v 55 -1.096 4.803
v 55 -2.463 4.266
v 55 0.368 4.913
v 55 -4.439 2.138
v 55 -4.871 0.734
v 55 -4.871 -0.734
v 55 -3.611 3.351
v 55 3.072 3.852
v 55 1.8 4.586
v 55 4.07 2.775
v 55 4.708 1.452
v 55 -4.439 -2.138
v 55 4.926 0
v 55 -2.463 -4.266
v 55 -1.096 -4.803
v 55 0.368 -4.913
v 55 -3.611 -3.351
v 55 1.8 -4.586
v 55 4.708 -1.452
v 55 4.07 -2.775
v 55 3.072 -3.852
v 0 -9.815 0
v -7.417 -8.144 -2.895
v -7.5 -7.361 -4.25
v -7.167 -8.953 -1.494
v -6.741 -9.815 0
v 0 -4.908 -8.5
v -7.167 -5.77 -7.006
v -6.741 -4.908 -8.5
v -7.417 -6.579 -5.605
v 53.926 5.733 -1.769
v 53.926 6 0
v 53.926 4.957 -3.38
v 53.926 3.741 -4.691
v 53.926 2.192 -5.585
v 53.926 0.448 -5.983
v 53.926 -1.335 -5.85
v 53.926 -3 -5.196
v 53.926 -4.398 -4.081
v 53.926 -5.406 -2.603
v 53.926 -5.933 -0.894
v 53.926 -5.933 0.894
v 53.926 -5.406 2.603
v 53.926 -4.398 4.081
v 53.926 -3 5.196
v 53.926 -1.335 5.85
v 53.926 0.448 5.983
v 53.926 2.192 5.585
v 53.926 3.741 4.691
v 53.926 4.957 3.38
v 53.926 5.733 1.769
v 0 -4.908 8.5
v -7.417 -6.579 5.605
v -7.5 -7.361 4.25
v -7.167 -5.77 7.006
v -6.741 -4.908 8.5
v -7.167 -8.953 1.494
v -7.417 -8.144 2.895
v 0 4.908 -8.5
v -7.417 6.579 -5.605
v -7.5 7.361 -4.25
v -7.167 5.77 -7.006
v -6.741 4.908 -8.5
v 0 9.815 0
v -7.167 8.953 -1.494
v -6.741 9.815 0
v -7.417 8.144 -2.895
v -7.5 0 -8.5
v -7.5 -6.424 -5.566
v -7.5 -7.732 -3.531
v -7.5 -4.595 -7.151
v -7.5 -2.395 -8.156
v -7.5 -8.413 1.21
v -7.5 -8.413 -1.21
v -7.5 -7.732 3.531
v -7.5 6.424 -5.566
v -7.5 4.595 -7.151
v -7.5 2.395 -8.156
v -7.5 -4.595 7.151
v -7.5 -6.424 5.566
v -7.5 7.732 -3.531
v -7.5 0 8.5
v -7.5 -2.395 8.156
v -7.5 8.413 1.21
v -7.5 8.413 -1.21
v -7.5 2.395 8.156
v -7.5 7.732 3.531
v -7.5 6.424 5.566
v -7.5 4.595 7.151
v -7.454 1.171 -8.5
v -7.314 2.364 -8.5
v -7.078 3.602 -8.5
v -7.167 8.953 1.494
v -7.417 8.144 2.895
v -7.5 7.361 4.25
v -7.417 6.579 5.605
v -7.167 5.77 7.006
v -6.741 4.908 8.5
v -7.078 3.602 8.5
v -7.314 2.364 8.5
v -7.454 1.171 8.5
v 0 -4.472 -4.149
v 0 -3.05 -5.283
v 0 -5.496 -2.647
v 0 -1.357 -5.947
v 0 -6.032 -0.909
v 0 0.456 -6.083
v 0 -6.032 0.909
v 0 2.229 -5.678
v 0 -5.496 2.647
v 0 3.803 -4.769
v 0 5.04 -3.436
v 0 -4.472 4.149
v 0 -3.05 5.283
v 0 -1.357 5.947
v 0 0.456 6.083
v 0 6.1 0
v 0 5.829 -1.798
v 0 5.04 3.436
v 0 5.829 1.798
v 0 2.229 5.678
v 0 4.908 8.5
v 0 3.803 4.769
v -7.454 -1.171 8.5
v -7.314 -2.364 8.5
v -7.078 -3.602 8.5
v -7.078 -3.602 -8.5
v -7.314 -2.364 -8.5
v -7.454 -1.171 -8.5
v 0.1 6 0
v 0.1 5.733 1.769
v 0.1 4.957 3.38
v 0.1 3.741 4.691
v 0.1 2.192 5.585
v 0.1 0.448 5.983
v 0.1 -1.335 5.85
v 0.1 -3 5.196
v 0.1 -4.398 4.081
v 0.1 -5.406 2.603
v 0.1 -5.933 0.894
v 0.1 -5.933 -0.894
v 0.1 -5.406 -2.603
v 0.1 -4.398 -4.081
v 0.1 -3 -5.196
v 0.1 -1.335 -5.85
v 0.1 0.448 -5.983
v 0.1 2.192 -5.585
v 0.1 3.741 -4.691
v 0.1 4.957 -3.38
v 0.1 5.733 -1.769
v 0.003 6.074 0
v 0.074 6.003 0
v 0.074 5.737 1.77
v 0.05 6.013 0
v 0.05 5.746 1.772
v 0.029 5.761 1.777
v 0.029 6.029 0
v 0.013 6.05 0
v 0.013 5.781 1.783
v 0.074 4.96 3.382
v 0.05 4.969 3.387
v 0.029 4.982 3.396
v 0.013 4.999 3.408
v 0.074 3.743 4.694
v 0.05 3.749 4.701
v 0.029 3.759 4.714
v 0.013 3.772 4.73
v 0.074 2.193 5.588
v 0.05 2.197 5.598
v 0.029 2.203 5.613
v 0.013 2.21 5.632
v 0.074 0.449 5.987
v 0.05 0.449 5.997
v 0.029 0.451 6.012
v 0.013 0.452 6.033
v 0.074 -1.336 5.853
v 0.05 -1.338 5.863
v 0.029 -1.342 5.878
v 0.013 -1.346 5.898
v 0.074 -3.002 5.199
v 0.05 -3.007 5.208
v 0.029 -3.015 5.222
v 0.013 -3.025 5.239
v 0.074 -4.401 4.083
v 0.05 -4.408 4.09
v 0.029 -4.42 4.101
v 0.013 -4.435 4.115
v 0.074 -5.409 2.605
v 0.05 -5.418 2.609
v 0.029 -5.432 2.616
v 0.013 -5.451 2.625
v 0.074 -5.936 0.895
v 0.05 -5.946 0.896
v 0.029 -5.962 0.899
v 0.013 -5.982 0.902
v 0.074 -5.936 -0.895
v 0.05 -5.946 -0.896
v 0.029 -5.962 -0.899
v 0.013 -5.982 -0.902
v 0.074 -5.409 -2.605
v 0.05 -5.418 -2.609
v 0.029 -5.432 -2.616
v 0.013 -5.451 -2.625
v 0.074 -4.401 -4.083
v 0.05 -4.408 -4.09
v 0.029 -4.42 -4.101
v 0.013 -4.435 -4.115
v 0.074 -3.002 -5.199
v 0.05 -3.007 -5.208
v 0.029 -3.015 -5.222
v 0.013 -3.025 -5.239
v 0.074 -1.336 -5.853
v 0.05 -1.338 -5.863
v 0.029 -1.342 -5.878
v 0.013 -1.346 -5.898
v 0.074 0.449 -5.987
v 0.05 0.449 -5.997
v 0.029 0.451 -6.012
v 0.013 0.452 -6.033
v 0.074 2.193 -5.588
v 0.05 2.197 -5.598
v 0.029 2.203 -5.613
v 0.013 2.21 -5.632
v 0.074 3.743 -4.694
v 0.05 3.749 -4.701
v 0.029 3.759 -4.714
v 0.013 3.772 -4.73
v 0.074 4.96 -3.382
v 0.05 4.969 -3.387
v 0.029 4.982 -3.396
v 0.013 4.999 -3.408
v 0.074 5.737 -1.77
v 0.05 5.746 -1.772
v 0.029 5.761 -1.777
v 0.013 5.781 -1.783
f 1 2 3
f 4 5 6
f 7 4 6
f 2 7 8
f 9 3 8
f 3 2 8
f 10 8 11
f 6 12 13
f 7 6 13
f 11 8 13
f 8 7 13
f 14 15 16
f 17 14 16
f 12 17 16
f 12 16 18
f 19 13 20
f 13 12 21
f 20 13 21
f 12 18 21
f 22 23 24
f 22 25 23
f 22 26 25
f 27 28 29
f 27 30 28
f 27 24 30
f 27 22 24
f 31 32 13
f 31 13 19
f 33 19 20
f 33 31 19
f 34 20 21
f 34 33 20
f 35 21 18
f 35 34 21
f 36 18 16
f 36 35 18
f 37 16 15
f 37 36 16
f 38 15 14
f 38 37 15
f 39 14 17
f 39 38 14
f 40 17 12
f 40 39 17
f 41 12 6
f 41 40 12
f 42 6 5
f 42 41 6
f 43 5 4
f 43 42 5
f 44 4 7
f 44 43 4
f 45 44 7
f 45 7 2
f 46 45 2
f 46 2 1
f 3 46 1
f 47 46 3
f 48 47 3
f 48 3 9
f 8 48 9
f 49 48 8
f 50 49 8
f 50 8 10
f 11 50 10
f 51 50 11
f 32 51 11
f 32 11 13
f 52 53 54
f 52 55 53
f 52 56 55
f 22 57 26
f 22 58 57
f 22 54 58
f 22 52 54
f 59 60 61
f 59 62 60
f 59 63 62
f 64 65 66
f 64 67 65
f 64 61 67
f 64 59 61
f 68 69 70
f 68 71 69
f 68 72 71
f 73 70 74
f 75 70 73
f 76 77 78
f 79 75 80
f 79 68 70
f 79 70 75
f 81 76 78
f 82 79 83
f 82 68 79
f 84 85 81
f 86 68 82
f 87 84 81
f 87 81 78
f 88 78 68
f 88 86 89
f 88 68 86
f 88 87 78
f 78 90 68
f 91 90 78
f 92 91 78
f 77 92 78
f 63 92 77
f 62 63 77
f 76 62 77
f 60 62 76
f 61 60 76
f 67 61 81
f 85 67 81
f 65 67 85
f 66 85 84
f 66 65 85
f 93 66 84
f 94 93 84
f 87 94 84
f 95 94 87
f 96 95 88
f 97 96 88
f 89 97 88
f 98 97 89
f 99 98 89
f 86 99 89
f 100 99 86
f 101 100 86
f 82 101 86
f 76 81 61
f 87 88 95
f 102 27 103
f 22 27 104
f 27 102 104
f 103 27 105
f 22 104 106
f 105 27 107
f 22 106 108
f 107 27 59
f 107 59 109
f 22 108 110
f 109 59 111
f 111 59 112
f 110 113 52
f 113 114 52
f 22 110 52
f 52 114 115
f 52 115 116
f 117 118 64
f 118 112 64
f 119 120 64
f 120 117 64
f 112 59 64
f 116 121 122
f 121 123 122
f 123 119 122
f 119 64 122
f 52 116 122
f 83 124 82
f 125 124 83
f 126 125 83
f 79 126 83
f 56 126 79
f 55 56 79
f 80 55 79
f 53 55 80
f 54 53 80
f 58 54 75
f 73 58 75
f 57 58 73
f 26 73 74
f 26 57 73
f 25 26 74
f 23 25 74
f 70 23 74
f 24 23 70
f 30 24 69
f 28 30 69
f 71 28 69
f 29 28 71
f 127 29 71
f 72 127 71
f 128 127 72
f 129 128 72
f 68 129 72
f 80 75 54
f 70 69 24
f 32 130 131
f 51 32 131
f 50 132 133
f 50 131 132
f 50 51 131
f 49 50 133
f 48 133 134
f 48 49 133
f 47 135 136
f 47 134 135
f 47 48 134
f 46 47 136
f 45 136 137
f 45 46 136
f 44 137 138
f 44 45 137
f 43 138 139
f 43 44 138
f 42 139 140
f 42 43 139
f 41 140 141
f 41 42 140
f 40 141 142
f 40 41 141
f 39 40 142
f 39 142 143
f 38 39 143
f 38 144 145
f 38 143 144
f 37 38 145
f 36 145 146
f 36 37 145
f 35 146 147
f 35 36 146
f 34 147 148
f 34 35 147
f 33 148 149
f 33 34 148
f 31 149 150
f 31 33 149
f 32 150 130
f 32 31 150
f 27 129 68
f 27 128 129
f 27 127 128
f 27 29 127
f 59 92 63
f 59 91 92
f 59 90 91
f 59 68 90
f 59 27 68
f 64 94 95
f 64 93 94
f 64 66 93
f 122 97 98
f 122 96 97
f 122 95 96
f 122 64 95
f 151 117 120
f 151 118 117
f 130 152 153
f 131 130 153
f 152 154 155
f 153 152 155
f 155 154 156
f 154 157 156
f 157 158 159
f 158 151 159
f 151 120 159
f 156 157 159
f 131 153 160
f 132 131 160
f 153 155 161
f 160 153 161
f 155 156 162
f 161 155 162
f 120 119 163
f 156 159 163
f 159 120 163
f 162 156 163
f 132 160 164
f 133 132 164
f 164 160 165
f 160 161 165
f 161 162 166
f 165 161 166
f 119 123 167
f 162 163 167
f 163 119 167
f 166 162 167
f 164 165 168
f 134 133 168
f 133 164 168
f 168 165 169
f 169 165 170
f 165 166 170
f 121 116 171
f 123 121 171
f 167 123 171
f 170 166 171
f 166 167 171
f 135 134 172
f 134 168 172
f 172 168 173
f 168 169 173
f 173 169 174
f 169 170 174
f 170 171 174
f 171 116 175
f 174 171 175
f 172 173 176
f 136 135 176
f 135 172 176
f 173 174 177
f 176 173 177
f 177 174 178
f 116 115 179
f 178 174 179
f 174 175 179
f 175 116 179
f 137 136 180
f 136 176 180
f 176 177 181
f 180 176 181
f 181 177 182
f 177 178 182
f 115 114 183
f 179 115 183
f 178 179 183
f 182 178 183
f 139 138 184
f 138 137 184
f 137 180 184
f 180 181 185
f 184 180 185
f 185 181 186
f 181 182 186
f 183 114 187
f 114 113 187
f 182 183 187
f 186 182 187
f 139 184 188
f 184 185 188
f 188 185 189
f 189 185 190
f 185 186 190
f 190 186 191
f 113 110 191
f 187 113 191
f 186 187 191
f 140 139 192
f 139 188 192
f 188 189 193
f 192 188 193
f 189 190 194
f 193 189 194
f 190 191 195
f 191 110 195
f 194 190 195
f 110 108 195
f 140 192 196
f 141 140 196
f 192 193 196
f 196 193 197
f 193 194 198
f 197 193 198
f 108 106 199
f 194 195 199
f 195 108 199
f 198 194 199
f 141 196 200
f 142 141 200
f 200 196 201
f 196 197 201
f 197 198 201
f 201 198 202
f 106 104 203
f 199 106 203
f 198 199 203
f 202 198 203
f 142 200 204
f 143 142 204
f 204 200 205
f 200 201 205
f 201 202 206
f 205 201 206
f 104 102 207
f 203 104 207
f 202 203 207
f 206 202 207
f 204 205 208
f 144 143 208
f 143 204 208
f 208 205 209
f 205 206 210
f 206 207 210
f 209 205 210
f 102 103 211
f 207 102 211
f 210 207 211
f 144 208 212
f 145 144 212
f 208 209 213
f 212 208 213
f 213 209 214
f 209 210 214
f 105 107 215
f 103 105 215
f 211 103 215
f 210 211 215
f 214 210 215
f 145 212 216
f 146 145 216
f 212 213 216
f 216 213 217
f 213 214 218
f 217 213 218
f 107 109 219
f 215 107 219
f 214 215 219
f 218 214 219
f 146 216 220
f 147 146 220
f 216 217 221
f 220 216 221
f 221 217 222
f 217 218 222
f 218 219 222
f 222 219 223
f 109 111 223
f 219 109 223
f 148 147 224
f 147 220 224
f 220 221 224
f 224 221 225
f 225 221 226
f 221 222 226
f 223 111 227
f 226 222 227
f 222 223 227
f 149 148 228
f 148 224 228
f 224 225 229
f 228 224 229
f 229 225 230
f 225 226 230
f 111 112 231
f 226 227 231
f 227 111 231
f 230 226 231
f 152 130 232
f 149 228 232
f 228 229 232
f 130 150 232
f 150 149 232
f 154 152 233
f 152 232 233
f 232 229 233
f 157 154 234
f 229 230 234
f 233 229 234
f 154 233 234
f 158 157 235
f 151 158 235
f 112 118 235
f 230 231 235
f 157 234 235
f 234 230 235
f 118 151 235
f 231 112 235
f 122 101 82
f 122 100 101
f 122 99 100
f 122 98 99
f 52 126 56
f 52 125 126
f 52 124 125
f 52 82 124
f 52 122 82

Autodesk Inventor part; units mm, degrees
ref_plane "YZ Plane" through (0, 0, 0) normal (1, 0, 0) x (0, 1, 0)
ref_plane "XZ Plane" through (0, 0, 0) normal (0, 1, 0) x (-1, 0, 0)
sketch "Skizze1" plane through (0, 0, 0) normal (0, 0, 1) x (1, 0, 0)
  line L0 (0, 6) -> (55, 6)
  line L1 (55, 6) -> (55, 0)
  line L2 (55, 0) -> (0, 0)
  line L3 (-11, 0) -> (66, 0) projected
  line L4 (0, -1.2) -> (0, 7.2) projected
  line L5 (0, 6) -> (0, 0)
  dimension "d2" = 12
  dimension "d59" = 55
revolve "Körper" add sketch "Skizze1" angle 360 about axis through (55, 0, 0) along (-1, 0, 0)
sketch "Skizze2" plane through (0, 0, 0) normal (-1, 0, 0) x (0, 0, 1)
  line L0 (0, 9.815) -> (8.5, 4.9075)
  line L1 (8.5, 4.9075) -> (8.5, -4.9075)
  line L2 (8.5, -4.9075) -> (0, -9.815)
  line L3 (0, -9.815) -> (-8.5, -4.9075)
  line L4 (-8.5, -4.9075) -> (-8.5, 4.9075)
  line L5 (-8.5, 4.9075) -> (0, 9.815)
  line L6 (-11.9, 0) -> (11.9, 0) projected
  line L7 (0, 13.7409) -> (0, -13.7409) projected
  point P0 (0, 0)
  point P1 (0, 0)
  dimension "d11" = 17
extrude "Kopf" add sketch "Skizze2" along normal blind 7.5
sketch "Skizze4" plane through (0, 0, 0) normal (0, 0, 1) x (1, 0, 0)
  line L0 (-6.5185, 10.2) -> (-7.5, 8.5)
  line L1 (-1.1, 0) -> (-0.234, 0)
  line L2 (-8.9532, 0) -> (1.2192, 0) projected
  line L3 (-7.5, 10.2) -> (-6.5185, 10.2)
  line L4 (-7.5, 8.5) -> (-7.5, 10.2)
  line L5 (0, 12.24) -> (0, -2.04) projected
  dimension "d65" = 17
  dimension "d67" = 30
  dimension "d68" = 20.4
  dimension "d69" = 7.5
revolve "Fase1" cut sketch "Skizze4" angle 360 about axis through (-1.1, 0, 0) along (1, 0, 0)
thread "Gewinde" size "M12x1.75" class "6g" standard "ISO Metric profile" length 30
chamfer "Fase2" distance 1.0735 distance2 1.0736 1 edges at (55, -6, 0) measured on face at (55, 1.497, -1.3262)
fillet "Fillet2" radius 0.1 1 edges at (0, -6, 0)
ref_plane "Work Plane1" through (1.525, 0, 0) normal (0, 0, 1) x (1, 0, 0)
equation "\"d2\" = GD"
equation "\"d59\" = NLG"
equation "\"d11\" = SW"
equation "\"d3\" = KOH"
equation "\"d71\" = RR"
equation "\"d15\" = GEL"
equation "\"d6\" = -0.5 * SPD + 0.5 * GD"
equation "\"d65\" = SW"
equation "\"d67\" = ANG1"
equation "\"d68\" = 1.2 * SW"
equation "\"d69\" = KOH"
equation "\"NLG\" = 55"
equation "\"GD\" = NND"
equation "\"BDM\" = NND"
equation "\"KOH\" = 7.5"
equation "\"GEL\" = 30"
equation "\"SW\" = 17"
equation "\"SW0\" = SW"
equation "\"SPD\" = NND - 1.2269 * PTC"
equation "\"SD2\" = NND"
equation "\"SD\" = 0"
equation "\"ANG1\" = 30deg"
equation "\"GAL\" = 0.61345 * PTC"
equation "\"GUL\" = 0.61345 * PTC"
equation "\"RR\" = 0.1"
equation "\"RR1\" = 0.1"
equation "\"GD1\" = THREADDIA - 1.2269 * PTC"
equation "\"THREADDIA\" = 12"
equation "\"TOA\" = 30deg"
equation "\"PTC\" = 1.75"
equation "\"NND\" = 12"
equation "\"E0\" = 1.155 * SW"
properties part number "ISO 4016 - M12 x 55" material "Steel, Mild"
